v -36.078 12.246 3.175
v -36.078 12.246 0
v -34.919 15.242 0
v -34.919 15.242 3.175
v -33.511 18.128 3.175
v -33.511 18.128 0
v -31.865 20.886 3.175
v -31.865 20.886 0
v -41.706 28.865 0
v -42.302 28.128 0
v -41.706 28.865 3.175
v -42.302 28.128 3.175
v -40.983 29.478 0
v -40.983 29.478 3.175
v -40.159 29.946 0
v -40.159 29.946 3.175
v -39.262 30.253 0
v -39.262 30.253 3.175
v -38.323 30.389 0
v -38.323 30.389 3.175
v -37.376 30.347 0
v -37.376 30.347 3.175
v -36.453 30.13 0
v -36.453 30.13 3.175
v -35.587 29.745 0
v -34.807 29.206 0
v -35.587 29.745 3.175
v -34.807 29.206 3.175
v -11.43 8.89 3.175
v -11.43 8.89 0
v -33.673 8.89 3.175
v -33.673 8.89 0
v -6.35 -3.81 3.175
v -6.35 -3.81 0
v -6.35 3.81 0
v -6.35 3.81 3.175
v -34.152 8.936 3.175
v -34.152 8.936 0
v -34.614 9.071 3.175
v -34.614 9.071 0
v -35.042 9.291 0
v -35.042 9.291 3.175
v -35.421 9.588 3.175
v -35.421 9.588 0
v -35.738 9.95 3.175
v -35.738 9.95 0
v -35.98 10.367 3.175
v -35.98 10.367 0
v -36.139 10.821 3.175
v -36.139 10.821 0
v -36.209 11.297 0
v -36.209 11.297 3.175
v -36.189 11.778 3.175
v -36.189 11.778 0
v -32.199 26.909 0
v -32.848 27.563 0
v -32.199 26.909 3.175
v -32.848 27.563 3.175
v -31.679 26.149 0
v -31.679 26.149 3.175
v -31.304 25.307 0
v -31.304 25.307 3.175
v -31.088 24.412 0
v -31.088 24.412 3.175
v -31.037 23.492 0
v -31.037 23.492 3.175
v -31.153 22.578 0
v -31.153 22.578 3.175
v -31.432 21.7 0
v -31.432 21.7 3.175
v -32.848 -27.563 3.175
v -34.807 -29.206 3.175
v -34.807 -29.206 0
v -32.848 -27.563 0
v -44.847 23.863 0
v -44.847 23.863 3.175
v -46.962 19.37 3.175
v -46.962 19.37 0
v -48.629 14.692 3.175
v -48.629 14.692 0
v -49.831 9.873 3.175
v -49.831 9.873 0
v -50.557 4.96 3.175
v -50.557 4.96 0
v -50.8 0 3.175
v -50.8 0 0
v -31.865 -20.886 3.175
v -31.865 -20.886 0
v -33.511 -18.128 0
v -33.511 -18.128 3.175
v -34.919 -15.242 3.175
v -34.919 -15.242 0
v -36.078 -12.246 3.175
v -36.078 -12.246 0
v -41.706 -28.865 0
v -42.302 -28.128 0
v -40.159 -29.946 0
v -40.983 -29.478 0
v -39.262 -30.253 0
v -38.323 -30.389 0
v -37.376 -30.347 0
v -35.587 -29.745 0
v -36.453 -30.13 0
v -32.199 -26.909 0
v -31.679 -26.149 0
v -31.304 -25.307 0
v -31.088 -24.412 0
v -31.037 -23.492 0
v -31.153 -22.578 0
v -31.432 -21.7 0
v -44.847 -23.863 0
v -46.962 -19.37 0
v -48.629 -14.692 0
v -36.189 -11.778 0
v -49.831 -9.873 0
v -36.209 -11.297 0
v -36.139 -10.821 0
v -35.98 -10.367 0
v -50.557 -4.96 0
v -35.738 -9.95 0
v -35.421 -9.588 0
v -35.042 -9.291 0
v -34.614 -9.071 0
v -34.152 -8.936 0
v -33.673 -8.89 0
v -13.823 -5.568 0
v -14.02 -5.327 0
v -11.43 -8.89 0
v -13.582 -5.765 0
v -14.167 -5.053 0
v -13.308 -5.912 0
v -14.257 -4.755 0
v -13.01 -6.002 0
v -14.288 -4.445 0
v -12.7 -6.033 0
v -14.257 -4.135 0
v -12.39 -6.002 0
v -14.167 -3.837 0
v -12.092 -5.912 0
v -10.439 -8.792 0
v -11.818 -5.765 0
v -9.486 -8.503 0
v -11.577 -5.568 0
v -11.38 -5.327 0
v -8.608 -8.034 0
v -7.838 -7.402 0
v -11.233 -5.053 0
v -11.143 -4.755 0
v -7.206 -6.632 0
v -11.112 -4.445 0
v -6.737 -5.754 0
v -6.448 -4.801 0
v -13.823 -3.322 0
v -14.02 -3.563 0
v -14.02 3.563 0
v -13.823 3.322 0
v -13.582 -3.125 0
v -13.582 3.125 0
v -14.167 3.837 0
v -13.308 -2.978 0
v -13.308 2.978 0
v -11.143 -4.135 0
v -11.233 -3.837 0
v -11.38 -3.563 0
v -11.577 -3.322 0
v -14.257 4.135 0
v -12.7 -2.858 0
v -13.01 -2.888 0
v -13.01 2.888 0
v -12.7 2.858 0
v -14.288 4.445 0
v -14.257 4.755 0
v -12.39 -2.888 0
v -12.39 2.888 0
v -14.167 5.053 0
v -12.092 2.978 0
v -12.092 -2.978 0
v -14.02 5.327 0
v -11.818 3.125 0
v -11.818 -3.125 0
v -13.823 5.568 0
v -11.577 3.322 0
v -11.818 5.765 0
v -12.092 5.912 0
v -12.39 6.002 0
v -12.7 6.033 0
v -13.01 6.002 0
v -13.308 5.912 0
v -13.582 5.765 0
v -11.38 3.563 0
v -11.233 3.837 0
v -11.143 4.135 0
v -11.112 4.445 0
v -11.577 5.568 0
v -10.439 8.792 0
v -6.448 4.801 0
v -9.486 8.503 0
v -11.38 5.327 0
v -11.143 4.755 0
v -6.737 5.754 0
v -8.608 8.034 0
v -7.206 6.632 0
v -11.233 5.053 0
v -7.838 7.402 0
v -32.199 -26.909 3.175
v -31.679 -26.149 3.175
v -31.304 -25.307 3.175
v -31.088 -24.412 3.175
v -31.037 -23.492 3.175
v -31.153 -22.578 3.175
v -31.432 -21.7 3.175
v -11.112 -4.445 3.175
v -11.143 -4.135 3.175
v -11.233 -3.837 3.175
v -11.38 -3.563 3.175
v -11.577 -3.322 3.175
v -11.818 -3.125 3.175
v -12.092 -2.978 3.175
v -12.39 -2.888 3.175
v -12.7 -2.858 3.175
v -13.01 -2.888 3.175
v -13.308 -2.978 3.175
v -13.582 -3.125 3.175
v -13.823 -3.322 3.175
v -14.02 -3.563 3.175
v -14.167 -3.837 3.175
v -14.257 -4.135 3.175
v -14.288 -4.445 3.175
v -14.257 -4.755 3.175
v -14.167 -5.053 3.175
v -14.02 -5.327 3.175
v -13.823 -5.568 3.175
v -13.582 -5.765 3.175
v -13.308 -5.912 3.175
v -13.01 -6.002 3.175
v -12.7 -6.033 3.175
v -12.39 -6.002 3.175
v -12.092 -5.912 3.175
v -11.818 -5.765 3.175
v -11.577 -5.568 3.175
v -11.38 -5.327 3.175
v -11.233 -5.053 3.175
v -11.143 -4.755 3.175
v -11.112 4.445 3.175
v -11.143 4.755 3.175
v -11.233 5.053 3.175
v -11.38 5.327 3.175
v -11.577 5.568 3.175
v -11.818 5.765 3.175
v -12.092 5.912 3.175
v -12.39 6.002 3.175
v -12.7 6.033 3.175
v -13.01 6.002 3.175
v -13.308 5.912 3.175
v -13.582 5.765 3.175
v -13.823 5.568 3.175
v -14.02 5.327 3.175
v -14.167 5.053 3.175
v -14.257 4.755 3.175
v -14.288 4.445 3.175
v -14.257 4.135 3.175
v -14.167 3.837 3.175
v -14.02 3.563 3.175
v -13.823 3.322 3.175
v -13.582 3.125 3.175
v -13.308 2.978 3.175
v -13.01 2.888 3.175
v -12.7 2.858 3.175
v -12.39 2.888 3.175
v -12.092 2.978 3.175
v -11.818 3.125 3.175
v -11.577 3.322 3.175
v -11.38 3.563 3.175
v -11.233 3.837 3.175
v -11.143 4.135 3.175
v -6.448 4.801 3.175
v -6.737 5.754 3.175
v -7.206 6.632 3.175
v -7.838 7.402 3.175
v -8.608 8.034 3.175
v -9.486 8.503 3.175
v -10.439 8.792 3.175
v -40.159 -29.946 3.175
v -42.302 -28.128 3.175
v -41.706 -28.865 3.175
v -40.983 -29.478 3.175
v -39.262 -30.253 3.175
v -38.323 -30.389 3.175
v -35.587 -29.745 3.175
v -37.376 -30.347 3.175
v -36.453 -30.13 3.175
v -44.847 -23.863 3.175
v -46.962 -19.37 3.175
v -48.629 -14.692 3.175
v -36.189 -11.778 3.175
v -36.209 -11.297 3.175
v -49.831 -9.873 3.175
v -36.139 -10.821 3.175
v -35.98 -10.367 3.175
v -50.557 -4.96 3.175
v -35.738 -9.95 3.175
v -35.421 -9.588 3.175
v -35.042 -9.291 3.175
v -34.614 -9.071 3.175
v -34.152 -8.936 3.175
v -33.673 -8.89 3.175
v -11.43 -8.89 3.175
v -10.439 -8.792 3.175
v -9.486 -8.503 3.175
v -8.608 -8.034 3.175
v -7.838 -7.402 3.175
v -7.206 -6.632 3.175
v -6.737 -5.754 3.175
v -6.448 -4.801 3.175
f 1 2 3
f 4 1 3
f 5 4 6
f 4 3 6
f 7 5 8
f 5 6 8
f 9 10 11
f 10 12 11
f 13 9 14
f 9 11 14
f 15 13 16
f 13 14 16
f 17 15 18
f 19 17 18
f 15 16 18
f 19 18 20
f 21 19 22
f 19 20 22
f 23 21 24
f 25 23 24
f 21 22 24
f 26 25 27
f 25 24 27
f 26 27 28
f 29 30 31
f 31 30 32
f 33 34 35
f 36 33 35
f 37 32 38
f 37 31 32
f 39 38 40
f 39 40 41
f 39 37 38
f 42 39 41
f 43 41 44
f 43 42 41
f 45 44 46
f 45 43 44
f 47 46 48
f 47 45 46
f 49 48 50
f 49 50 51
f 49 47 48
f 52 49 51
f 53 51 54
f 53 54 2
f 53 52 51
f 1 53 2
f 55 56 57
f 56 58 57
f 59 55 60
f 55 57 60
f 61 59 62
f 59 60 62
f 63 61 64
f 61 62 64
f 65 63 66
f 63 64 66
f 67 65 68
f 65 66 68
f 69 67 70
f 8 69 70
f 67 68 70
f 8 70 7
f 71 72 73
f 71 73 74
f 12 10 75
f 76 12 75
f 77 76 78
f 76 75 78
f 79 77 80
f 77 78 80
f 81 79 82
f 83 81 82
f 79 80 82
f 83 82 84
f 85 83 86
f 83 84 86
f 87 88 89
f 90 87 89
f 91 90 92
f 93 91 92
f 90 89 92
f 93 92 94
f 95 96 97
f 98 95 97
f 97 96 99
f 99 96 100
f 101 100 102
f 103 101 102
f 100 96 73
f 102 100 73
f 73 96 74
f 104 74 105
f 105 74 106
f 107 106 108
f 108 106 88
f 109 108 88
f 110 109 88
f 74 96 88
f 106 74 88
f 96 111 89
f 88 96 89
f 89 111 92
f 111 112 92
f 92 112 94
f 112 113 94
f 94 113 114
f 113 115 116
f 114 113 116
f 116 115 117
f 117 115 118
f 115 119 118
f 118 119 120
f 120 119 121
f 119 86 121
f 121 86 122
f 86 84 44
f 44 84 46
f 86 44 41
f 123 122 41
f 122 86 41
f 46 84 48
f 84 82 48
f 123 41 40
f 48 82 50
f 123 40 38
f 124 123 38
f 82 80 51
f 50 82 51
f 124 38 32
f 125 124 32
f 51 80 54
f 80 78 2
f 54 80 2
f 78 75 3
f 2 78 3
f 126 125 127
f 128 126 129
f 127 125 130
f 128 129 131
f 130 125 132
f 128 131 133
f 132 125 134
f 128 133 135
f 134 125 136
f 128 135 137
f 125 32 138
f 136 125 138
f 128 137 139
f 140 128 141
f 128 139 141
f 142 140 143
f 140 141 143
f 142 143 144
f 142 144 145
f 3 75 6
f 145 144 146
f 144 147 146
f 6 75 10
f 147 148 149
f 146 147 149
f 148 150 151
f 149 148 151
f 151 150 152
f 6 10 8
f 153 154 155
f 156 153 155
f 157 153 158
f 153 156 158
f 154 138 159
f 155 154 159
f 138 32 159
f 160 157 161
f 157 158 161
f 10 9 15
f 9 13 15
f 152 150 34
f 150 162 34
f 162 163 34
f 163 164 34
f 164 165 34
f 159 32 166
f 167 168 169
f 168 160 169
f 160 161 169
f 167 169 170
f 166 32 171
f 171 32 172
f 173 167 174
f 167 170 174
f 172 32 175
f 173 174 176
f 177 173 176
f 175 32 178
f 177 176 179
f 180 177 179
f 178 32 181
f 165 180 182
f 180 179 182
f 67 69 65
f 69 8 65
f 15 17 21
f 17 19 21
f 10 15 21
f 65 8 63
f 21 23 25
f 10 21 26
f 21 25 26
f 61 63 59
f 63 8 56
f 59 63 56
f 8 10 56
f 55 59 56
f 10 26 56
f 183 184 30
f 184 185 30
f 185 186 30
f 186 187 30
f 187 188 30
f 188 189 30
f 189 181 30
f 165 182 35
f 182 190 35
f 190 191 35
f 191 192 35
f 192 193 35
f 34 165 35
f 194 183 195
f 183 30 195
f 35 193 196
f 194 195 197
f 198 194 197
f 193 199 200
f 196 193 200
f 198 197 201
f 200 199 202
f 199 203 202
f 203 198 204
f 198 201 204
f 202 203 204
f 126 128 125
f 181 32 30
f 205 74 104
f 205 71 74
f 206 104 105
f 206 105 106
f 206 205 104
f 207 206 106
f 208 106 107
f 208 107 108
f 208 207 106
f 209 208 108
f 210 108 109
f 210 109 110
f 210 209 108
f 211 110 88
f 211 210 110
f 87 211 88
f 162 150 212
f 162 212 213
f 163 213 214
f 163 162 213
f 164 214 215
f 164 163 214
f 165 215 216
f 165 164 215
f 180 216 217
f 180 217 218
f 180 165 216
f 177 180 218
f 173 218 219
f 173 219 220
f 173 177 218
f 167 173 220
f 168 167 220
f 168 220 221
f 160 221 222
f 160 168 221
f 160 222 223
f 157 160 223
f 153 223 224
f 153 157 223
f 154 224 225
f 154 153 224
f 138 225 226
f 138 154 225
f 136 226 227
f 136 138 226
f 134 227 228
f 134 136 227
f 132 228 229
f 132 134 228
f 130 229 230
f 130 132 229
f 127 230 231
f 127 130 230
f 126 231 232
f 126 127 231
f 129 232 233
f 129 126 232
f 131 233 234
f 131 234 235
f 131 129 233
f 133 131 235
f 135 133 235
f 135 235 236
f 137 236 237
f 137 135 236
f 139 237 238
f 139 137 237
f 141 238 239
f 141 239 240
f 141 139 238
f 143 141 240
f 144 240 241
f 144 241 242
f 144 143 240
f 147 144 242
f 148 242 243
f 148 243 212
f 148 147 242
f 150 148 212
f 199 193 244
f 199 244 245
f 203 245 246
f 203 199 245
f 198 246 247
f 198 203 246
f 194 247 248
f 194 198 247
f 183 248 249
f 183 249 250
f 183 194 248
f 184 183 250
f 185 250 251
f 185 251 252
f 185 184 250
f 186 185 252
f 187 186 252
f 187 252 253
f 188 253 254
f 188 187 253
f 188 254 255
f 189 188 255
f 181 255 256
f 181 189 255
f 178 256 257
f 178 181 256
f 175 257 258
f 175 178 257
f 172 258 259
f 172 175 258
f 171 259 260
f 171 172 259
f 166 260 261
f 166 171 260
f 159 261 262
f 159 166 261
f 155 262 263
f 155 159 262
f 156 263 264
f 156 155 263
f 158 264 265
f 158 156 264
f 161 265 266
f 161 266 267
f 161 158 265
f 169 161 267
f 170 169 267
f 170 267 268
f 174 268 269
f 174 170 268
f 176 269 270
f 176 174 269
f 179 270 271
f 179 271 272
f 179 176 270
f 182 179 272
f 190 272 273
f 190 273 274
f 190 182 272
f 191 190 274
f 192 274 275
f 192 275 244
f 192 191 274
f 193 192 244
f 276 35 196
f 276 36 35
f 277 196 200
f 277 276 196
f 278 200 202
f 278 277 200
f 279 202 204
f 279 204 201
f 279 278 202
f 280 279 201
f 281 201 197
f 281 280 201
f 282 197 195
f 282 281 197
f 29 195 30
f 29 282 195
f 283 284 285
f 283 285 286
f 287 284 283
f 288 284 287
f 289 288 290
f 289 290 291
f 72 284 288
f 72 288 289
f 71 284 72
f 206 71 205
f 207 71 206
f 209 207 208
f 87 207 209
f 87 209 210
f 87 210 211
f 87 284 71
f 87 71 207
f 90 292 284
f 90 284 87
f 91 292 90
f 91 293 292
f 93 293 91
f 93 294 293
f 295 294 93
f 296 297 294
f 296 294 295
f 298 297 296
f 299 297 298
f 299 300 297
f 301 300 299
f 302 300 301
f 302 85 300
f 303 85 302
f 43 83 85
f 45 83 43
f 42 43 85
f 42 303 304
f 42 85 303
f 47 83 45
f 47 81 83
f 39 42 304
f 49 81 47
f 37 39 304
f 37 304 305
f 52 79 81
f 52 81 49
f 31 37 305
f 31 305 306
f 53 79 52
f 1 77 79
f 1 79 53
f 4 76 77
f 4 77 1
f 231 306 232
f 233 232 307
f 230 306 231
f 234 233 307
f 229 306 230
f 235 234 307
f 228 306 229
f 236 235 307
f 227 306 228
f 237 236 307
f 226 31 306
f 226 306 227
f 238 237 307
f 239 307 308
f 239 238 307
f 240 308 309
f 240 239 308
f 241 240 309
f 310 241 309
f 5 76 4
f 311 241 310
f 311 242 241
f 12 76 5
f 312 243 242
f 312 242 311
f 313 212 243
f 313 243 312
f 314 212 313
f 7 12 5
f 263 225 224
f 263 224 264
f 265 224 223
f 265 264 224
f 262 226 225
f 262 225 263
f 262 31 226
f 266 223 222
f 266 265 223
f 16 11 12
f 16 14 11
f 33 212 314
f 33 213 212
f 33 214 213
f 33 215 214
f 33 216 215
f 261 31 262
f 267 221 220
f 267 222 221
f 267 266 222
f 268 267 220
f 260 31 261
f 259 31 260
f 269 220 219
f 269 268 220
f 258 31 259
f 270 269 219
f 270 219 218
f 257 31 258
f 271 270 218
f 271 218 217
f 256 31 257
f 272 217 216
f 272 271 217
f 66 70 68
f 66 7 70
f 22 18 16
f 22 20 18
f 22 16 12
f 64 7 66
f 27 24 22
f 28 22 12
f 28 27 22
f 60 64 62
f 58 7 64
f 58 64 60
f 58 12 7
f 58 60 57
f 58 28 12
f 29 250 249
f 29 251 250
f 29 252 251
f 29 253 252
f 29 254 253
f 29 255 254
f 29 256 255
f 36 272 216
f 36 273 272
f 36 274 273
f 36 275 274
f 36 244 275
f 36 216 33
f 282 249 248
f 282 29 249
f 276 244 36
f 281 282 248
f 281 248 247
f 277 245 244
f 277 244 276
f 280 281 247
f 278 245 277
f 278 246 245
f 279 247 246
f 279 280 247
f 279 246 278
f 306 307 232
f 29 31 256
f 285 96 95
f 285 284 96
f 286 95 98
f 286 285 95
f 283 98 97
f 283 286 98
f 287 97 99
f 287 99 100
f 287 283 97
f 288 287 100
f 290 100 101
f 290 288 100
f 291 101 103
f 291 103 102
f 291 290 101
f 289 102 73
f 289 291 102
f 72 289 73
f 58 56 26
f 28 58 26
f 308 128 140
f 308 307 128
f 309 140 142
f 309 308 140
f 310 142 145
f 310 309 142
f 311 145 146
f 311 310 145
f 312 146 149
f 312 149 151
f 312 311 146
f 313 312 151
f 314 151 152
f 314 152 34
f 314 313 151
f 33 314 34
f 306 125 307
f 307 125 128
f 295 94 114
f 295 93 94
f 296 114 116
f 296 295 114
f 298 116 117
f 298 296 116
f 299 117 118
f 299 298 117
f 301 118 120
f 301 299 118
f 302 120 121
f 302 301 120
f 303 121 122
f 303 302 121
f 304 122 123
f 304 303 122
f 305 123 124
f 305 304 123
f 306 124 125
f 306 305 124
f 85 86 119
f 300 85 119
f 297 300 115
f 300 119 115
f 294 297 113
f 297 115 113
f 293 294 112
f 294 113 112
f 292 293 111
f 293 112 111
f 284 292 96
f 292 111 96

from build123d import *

# Parameters (mm, degrees)
F0_R     = 1.5875
F1_DEPTH = 3.175
F2_R     = 5.08
F3_R     = 5.08
F4_R     = 2.54
F5_R     = 5.08


with BuildPart() as f1:
    # F0 (on Top) → F1 (new body)
    with BuildSketch(Plane.XY):
        with BuildLine():
            ThreePointArc((-50.8, 0), (-47.7363851359, -17.3746232809), (-38.9150577104, -32.6536105721))
            Line((-38.9150577104, -32.6536105721), (-29.1862932828, -24.4902079291))
            ThreePointArc((-29.1862932828, -24.4902079291), (-34.023485561, -17.14679067), (-37.0483184504, -8.89))
            Line((-37.0483184504, -8.89), (-6.35, -8.89))
            Line((-6.35, -8.89), (-6.35, 0))
            Line((-6.35, 0), (-6.35, 8.89))
            Line((-6.35, 8.89), (-37.0483184504, 8.89))
            ThreePointArc((-37.0483184504, 8.89), (-34.023485561, 17.14679067), (-29.1862932828, 24.4902079291))
            Line((-29.1862932828, 24.4902079291), (-38.9150577104, 32.6536105721))
            ThreePointArc((-38.9150577104, 32.6536105721), (-47.7363851359, 17.3746232809), (-50.8, 0))
        make_face()
        with Locations((-12.7, -4.445)):
            Circle(F0_R, mode=Mode.SUBTRACT)
        with Locations((-12.7, 4.445)):
            Circle(F0_R, mode=Mode.SUBTRACT)
    extrude(amount=F1_DEPTH)

    # F2
    f2_edges = [f1.edges().sort_by_distance(p)[0] for p in [
        (-38.915058, 32.653611, 1.5875),
        (-38.915058, -32.653611, 1.5875),
    ]]
    fillet(f2_edges, radius=F2_R)

    # F3
    f3_edges = [f1.edges().sort_by_distance(p)[0] for p in [
        (-29.186293, 24.490208, 1.5875),
        (-29.186293, -24.490208, 1.5875),
    ]]
    fillet(f3_edges, radius=F3_R)

    # F4
    f4_edges = [f1.edges().sort_by_distance(p)[0] for p in [
        (-37.048318, -8.89, 1.5875),
        (-37.048318, 8.89, 1.5875),
    ]]
    fillet(f4_edges, radius=F4_R)

    # F5
    f5_edges = [f1.edges().sort_by_distance(p)[0] for p in [
        (-6.35, 8.89, 1.5875),
        (-6.35, -8.89, 1.5875),
    ]]
    fillet(f5_edges, radius=F5_R)


solid = f1.part
